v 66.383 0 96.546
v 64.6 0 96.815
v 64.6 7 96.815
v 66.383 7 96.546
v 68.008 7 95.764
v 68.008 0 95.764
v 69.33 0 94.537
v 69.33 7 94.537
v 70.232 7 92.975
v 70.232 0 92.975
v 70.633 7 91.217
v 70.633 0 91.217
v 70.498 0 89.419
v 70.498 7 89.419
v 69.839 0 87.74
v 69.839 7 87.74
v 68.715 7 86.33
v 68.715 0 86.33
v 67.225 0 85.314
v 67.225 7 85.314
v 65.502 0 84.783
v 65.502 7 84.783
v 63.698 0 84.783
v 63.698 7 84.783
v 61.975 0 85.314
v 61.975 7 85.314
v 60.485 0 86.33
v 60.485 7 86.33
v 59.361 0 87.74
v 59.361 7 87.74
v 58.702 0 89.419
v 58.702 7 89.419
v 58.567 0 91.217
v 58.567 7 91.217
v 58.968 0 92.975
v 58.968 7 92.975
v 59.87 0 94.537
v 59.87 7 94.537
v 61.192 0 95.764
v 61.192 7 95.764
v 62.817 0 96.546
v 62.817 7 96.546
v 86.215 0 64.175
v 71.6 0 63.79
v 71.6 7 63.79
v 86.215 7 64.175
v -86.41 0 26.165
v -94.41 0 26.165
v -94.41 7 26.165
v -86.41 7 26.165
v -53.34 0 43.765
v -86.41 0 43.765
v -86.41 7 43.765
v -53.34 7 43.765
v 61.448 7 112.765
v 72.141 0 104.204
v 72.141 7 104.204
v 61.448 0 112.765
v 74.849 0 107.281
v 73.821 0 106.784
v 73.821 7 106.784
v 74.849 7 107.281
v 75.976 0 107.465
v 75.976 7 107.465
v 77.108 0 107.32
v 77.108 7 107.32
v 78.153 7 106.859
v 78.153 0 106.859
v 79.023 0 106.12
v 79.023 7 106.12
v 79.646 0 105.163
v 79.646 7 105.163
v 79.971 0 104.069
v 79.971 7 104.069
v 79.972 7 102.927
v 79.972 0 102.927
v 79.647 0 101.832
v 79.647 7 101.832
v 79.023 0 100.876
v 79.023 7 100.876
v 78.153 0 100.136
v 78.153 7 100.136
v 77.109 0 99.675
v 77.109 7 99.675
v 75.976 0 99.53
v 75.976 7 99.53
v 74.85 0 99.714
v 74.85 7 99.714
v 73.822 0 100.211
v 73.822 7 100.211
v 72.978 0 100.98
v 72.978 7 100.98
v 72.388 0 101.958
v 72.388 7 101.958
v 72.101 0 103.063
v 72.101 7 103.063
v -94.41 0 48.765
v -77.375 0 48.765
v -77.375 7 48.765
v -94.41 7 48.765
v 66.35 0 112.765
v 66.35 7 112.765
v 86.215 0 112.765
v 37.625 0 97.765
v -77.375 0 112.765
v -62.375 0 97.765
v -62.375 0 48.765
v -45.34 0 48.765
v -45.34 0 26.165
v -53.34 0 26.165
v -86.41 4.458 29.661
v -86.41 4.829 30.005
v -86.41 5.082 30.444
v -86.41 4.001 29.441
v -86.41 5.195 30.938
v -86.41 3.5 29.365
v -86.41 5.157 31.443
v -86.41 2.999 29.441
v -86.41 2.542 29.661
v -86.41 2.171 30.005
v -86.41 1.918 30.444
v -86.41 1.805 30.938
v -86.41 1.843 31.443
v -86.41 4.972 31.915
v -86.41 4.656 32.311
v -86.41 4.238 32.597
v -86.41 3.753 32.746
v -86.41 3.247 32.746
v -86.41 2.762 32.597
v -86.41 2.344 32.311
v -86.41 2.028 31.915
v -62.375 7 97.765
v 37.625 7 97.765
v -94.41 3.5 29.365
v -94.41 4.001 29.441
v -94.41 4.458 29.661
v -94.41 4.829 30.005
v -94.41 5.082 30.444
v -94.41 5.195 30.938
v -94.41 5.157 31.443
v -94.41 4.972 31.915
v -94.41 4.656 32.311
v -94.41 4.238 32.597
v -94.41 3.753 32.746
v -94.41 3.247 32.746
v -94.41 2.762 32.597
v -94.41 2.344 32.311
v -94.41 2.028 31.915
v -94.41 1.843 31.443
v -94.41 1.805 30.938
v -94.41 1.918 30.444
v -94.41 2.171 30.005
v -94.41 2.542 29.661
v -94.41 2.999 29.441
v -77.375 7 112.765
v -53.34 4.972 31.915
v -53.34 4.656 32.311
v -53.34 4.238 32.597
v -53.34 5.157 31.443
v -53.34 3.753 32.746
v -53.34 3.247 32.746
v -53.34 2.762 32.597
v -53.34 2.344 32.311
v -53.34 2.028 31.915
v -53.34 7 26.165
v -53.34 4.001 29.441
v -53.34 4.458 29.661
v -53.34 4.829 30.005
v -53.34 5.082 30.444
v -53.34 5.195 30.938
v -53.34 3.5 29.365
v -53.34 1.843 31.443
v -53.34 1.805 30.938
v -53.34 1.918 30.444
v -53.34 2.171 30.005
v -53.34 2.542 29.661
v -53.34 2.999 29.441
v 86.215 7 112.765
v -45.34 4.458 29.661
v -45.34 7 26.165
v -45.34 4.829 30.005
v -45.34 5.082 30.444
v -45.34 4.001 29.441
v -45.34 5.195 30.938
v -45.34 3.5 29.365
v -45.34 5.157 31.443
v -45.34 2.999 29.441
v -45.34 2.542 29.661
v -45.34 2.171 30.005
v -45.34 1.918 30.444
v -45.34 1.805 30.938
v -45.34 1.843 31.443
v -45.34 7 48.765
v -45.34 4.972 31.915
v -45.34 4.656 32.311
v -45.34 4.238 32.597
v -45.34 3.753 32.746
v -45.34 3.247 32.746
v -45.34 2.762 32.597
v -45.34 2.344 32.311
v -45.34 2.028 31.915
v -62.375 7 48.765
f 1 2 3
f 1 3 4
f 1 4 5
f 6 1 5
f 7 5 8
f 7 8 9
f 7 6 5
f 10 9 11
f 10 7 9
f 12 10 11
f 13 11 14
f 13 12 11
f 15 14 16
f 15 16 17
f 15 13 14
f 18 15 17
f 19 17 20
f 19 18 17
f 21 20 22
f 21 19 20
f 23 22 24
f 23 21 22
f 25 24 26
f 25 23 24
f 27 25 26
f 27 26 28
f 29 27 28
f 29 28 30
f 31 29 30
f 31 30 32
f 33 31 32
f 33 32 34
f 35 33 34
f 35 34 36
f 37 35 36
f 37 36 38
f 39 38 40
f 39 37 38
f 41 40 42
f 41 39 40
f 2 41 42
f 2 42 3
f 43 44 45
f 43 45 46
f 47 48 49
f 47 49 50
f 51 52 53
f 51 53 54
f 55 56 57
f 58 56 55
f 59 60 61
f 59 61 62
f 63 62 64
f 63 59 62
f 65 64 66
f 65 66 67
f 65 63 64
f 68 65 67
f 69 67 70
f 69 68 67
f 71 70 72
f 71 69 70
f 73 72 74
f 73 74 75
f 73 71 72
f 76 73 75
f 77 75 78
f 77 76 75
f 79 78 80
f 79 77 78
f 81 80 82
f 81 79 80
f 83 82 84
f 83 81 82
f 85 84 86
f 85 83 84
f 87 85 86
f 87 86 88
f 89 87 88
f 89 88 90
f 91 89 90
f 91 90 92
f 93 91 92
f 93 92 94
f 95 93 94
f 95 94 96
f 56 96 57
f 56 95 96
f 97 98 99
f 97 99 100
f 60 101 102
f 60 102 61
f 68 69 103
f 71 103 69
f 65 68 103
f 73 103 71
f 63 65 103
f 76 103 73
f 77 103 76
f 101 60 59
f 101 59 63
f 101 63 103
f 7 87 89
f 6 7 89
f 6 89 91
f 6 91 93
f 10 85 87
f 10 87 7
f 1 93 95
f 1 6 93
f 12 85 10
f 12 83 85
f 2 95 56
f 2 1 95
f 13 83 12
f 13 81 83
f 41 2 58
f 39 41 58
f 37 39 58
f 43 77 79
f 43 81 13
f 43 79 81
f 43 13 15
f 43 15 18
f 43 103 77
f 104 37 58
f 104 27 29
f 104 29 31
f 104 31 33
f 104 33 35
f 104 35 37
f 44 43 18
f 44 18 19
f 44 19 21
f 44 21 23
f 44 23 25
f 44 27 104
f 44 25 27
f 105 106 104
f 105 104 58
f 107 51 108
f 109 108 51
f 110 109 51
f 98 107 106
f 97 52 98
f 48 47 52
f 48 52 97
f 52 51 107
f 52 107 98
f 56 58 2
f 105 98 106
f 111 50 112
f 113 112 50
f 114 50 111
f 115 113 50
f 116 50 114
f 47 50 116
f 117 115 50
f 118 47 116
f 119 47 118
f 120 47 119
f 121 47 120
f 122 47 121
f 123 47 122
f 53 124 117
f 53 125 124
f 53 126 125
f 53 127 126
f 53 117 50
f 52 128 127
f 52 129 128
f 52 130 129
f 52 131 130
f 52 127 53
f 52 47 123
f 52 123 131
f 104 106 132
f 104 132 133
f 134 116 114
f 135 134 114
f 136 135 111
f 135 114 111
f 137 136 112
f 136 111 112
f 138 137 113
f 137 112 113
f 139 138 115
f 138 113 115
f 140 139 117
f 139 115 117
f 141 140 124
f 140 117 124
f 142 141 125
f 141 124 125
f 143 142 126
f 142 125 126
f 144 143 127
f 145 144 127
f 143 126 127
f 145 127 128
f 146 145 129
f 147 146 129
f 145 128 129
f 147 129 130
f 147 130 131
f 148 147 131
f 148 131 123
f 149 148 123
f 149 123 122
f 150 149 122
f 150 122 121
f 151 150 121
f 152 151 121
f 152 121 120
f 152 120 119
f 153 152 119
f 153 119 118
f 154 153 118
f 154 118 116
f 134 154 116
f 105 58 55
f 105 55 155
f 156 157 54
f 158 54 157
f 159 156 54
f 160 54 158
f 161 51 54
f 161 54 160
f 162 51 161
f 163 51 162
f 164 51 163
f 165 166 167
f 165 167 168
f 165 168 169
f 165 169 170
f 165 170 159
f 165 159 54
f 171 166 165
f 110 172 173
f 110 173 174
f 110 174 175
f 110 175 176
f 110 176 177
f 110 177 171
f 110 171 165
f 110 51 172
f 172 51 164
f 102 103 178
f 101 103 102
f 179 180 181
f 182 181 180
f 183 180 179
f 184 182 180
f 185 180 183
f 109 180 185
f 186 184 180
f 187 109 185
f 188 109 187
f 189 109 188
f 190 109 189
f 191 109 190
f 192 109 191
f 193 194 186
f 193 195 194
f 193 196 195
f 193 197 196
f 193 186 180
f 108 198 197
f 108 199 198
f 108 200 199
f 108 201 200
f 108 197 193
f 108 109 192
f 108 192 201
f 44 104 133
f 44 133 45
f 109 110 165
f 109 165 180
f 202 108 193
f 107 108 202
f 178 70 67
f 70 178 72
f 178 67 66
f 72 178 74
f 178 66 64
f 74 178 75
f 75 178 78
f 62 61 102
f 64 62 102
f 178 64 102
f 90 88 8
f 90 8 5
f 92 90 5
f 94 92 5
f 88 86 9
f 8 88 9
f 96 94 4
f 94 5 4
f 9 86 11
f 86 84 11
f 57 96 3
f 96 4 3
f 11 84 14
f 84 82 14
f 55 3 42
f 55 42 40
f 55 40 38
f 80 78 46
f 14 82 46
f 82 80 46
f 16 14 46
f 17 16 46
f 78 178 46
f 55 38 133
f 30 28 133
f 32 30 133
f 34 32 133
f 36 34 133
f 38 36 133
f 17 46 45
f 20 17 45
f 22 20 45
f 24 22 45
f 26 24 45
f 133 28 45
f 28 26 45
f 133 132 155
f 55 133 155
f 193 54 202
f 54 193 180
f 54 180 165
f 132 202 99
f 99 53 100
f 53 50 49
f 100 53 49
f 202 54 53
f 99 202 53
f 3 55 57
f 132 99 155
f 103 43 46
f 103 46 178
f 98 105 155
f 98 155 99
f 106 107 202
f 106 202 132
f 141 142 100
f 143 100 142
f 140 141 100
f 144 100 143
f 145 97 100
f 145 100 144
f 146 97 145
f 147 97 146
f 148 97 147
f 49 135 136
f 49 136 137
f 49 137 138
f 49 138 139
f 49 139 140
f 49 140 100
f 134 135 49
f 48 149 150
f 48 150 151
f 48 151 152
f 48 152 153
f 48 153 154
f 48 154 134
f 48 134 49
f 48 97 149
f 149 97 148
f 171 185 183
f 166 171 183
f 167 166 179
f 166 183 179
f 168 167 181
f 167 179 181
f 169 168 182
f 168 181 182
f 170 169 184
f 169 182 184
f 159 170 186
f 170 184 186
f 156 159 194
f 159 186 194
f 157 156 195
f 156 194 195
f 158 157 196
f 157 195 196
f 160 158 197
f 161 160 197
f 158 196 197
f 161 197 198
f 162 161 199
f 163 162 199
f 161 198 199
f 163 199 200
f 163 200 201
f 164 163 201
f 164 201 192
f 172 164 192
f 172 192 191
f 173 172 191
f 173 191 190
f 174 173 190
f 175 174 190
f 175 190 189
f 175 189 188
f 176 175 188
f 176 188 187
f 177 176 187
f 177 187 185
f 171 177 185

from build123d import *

# Parameters (mm, degrees)
SKETCH1_R           = 6.05
BOSS_EXTRUDE1_DEPTH = 7
SKETCH3_R           = 1.7
CUT_EXTRUDE2_DEPTH  = 60


with BuildPart() as part:
    # Sketch1 → Boss-Extrude1 (new body)
    with BuildSketch(Plane(origin=(0, 0, 0), x_dir=(1, 0, 0), z_dir=(0, 1, 0))):
        with BuildLine():
            Line((-86.41, -26.165178012), (-86.41, -43.765178012))
            Line((-86.41, -43.765178012), (-53.34, -43.765178012))
            Line((-53.34, -43.765178012), (-53.34, -26.165178012))
            Line((-53.34, -26.165178012), (-45.34, -26.165178012))
            Line((-45.34, -26.165178012), (-45.34, -48.765178012))
            Line((-45.34, -48.765178012), (-62.375, -48.765178012))
            Line((-62.375, -48.765178012), (-62.375, -97.765178012))
            Line((-62.375, -97.765178012), (37.625, -97.765178012))
            Line((37.625, -97.765178012), (71.6, -63.790178012))
            Line((71.6, -63.790178012), (86.215, -64.175178012))
            Line((86.215, -64.175178012), (86.215, -112.765178012))
            Line((86.215, -112.765178012), (66.349963518, -112.765178012))
            Line((66.349963518, -112.765178012), (73.821063238, -106.783510987))
            ThreePointArc((73.821063238, -106.783510987), (79.369481987, -101.331578198), (72.140531111, -104.203997211))
            Line((72.140531111, -104.203997211), (61.447619718, -112.765178012))
            Line((61.447619718, -112.765178012), (37.625, -112.765178012))
            Line((37.625, -112.765178012), (-77.375, -112.765178012))
            Line((-77.375, -112.765178012), (-77.375, -48.765178012))
            Line((-77.375, -48.765178012), (-94.41, -48.765178012))
            Line((-94.41, -48.765178012), (-94.41, -26.165178012))
            Line((-94.41, -26.165178012), (-86.41, -26.165178012))
        make_face()
        with Locations(Location((64.6, -90.765178012, 0), (0, 0, 270))):
            Circle(SKETCH1_R, mode=Mode.SUBTRACT)
    extrude(amount=BOSS_EXTRUDE1_DEPTH)

    # Sketch3 → Cut-Extrude2 (cut)
    with BuildSketch(Plane(origin=(-45.34, 0, 0), x_dir=(0, 0, -1), z_dir=(1, 0, 0))):
        with Locations((-31.065178012, 3.5)):
            Circle(SKETCH3_R)
    extrude(amount=-CUT_EXTRUDE2_DEPTH, mode=Mode.SUBTRACT)


solid = part.part
